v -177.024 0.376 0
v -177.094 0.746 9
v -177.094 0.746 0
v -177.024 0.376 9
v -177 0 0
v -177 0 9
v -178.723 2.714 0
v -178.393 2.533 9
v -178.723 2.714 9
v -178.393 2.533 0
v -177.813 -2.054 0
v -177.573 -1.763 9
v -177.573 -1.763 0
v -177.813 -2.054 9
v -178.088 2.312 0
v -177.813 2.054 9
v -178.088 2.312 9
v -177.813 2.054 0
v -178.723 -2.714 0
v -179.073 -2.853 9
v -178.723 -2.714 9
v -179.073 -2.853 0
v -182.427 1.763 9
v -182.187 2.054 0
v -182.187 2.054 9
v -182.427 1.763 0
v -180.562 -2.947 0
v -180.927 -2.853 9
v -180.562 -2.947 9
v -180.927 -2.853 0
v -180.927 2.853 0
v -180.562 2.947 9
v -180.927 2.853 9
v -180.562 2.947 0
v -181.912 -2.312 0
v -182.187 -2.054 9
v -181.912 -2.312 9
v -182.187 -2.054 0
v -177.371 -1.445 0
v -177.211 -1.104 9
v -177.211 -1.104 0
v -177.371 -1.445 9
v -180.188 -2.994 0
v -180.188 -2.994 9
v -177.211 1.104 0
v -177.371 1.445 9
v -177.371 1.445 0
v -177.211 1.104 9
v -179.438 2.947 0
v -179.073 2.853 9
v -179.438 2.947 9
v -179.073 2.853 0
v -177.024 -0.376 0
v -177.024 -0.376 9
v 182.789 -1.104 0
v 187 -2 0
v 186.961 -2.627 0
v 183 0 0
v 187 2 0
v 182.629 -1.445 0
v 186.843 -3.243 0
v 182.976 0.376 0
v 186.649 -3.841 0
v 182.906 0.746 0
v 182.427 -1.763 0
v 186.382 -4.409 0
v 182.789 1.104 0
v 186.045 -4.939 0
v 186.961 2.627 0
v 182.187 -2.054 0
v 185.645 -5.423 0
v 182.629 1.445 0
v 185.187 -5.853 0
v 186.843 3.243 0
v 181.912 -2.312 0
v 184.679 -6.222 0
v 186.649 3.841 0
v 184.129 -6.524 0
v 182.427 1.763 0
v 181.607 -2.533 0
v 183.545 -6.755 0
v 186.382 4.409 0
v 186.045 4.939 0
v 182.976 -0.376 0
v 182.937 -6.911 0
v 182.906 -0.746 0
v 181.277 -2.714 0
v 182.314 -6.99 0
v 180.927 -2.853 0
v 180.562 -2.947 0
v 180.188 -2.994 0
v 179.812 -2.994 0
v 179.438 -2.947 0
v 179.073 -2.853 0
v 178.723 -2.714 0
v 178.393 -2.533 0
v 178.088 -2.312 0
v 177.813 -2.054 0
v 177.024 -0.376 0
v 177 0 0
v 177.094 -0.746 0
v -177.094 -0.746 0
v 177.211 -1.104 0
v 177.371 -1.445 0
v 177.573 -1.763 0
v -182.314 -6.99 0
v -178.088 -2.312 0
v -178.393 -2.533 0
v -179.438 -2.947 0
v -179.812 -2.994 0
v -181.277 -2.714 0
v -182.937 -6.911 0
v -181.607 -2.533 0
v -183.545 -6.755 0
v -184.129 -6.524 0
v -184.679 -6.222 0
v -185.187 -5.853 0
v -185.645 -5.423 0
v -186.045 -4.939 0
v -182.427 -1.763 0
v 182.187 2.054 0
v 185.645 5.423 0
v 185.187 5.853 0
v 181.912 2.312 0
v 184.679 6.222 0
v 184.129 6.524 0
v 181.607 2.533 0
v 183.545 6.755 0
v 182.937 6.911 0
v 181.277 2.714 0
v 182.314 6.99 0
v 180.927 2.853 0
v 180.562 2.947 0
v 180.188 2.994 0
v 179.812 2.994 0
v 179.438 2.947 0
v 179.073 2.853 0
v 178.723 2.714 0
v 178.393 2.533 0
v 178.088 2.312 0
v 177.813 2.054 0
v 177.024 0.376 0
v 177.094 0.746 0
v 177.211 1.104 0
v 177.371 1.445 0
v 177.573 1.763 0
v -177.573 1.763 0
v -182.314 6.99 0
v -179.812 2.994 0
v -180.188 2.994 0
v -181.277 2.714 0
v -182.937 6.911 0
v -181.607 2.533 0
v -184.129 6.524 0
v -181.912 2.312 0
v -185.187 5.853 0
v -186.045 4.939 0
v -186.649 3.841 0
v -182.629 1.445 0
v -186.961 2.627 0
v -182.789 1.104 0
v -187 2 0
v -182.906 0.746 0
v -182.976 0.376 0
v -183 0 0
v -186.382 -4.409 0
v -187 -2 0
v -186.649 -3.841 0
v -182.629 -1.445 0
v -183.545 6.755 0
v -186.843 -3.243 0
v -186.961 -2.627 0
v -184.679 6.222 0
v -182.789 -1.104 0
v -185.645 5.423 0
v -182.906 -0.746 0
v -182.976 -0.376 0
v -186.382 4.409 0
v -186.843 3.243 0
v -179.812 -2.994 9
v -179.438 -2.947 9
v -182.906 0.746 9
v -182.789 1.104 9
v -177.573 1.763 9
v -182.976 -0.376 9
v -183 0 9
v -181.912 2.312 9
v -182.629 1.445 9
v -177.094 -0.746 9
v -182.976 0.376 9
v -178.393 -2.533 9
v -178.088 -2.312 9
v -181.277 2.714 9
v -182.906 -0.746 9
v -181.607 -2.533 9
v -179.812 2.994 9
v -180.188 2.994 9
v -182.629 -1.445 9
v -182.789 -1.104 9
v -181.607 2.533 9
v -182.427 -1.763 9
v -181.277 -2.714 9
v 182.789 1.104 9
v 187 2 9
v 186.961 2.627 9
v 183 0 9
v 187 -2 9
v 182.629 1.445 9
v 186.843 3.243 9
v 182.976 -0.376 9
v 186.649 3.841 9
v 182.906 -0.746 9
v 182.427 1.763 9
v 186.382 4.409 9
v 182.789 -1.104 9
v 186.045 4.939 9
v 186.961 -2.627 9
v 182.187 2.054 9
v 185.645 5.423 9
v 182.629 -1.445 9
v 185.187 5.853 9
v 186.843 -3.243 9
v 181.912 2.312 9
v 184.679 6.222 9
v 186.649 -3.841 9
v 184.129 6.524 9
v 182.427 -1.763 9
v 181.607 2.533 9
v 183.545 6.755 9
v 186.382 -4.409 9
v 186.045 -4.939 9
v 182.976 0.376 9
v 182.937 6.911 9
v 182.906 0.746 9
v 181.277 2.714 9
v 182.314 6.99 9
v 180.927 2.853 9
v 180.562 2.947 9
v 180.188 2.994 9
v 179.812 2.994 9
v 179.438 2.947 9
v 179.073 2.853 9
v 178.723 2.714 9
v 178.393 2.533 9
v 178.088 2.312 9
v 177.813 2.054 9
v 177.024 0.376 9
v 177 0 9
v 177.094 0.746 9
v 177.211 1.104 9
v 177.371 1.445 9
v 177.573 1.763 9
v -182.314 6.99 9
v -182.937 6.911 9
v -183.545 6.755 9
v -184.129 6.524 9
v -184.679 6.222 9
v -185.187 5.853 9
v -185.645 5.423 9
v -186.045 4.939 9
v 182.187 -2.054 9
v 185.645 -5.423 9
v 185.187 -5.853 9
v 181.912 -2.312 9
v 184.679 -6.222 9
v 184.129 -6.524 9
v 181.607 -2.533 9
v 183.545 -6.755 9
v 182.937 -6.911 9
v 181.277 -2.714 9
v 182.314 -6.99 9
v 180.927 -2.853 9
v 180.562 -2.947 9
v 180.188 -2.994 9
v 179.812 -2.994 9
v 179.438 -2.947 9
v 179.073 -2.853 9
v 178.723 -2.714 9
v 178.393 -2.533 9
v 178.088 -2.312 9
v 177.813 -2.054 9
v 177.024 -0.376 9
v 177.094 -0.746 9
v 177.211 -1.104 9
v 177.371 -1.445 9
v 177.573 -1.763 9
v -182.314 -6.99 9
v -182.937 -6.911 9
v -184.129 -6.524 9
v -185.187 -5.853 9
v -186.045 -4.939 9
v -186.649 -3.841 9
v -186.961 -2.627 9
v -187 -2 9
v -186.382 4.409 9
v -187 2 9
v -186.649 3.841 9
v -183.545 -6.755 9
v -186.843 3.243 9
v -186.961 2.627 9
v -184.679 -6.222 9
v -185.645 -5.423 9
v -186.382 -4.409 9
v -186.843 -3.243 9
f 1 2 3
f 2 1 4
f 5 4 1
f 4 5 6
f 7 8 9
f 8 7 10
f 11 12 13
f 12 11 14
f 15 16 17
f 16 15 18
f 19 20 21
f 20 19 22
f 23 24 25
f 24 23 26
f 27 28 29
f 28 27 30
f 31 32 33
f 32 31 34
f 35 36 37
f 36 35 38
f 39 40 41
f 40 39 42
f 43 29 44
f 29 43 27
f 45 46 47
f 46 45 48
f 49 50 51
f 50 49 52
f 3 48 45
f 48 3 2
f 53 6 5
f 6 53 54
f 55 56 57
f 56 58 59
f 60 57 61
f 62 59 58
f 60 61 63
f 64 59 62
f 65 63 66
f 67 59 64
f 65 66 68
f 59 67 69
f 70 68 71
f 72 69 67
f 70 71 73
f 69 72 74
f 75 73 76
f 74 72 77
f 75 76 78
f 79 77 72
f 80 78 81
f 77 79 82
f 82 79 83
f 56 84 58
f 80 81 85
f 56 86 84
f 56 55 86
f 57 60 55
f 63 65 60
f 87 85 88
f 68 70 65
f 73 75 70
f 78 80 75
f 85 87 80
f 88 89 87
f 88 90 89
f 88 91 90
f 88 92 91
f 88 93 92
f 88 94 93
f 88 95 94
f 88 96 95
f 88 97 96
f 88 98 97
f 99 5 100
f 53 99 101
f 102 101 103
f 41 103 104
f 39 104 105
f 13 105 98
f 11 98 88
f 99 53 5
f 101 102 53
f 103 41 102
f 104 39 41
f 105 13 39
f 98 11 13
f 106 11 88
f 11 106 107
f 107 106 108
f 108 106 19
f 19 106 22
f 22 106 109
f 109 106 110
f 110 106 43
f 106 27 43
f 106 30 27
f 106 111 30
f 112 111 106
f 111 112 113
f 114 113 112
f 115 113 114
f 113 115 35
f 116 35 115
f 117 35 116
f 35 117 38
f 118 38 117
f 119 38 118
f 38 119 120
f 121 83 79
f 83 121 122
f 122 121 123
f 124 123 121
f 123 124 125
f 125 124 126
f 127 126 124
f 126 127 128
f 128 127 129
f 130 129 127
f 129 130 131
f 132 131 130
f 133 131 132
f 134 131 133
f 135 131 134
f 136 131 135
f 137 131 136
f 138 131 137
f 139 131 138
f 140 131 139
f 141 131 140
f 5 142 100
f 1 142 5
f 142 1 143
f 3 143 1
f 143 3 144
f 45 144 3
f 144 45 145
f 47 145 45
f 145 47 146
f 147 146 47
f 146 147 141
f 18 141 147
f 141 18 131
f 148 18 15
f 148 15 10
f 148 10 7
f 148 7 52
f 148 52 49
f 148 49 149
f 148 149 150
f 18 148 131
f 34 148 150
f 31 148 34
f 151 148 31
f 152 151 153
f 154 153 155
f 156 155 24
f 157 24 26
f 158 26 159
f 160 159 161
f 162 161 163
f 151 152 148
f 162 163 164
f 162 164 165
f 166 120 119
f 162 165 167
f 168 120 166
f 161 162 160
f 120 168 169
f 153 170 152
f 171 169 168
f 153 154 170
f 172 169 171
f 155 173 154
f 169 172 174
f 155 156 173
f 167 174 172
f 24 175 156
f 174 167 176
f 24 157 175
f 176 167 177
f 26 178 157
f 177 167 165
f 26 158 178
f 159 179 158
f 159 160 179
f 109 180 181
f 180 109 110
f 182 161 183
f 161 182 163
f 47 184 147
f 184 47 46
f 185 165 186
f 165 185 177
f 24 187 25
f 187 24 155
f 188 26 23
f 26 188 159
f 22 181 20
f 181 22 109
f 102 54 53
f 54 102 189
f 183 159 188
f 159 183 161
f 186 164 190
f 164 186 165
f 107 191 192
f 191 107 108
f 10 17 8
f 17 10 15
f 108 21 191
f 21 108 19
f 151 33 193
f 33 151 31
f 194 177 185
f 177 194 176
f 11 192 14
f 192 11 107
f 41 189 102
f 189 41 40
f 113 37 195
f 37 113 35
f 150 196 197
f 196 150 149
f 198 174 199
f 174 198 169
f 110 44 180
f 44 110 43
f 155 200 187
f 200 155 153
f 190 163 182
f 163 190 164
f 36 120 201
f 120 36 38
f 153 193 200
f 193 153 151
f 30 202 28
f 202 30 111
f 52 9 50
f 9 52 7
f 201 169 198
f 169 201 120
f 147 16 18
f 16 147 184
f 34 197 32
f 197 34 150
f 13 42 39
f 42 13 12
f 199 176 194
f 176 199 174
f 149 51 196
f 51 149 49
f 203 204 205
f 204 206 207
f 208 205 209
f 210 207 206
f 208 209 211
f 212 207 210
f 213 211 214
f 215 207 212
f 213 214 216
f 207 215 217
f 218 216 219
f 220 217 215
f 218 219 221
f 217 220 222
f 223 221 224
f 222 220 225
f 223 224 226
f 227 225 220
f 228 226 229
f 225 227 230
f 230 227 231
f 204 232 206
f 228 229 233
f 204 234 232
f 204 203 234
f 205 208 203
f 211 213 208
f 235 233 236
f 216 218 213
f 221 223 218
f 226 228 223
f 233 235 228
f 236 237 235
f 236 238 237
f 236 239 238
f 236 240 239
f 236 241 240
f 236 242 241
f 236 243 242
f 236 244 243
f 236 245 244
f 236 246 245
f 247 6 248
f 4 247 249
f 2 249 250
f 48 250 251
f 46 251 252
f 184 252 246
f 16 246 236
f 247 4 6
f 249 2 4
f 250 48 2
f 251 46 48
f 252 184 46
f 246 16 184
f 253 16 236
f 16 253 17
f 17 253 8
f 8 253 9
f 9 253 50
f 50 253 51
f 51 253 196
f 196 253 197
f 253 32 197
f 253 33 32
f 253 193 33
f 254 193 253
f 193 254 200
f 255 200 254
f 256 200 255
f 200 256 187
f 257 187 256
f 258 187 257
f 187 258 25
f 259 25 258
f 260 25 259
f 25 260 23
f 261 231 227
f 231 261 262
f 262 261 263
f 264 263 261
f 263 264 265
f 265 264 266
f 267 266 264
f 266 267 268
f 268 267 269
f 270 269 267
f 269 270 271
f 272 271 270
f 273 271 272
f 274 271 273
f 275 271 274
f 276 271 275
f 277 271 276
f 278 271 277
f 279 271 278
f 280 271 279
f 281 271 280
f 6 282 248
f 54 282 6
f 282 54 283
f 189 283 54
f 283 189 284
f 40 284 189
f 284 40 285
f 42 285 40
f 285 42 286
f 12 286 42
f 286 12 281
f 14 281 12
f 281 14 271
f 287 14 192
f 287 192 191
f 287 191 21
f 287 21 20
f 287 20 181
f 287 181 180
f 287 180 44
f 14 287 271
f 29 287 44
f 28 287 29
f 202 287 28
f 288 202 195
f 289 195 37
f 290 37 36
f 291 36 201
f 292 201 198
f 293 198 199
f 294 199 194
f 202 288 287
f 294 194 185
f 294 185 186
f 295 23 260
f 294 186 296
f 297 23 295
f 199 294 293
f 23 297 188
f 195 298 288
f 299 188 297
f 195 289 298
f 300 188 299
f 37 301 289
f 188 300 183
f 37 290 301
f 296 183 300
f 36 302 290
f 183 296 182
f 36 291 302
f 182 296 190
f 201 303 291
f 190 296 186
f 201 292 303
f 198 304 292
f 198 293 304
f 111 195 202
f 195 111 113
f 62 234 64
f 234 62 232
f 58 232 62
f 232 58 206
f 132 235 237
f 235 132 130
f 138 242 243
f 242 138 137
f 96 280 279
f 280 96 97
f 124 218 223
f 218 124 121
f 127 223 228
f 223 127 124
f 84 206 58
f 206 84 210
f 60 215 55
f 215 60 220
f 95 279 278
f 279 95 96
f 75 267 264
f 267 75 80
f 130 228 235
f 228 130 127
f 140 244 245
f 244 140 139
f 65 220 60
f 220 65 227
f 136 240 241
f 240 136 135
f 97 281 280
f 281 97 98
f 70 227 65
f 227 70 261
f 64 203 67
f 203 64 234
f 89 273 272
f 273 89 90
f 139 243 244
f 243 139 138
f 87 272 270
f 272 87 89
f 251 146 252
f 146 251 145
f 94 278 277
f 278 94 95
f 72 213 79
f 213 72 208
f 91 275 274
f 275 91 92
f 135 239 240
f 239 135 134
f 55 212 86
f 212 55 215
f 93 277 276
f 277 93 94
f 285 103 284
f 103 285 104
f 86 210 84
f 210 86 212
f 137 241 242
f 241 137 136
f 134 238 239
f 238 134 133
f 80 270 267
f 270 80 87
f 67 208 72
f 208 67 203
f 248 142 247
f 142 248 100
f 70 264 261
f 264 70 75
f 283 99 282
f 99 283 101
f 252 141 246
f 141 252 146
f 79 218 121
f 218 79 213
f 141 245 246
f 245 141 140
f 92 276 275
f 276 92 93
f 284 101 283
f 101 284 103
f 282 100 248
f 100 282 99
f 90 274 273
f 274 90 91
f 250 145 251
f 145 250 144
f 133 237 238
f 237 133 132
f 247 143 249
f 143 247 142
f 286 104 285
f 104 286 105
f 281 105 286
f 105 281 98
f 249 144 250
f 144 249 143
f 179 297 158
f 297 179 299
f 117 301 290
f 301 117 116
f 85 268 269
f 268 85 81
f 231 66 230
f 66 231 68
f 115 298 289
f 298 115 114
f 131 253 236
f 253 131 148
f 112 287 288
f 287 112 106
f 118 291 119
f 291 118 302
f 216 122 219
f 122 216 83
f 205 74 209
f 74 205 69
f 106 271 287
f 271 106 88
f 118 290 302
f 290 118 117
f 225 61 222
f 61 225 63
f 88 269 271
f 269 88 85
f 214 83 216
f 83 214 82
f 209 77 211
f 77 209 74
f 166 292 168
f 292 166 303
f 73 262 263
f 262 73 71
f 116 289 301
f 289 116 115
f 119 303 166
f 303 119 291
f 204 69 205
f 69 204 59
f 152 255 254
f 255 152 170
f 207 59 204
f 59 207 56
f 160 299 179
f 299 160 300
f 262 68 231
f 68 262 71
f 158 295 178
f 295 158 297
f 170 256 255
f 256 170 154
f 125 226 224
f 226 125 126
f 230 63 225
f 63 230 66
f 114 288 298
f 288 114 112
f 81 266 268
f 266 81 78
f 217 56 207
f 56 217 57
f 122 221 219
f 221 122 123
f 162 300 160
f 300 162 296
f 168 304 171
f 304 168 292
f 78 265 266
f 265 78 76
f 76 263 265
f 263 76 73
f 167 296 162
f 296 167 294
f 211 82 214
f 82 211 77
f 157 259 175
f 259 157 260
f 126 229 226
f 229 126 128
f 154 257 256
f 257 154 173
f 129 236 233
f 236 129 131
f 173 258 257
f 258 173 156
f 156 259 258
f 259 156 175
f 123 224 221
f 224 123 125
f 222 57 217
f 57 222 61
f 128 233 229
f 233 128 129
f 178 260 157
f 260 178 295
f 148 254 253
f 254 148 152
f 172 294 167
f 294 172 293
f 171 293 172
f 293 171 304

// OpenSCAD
$fn = 50;


difference() {
	union() {
		hull() {
			translate(v = [-182.0000000000, 2.0000000000, 0]) {
				cylinder(h = 9, r = 5);
			}
			translate(v = [182.0000000000, 2.0000000000, 0]) {
				cylinder(h = 9, r = 5);
			}
			translate(v = [-182.0000000000, -2.0000000000, 0]) {
				cylinder(h = 9, r = 5);
			}
			translate(v = [182.0000000000, -2.0000000000, 0]) {
				cylinder(h = 9, r = 5);
			}
		}
	}
	union() {
		translate(v = [-180.0000000000, 0.0000000000, 0]) {
			cylinder(h = 9, r = 3.0000000000);
		}
		translate(v = [180.0000000000, 0.0000000000, 0]) {
			cylinder(h = 9, r = 3.0000000000);
		}
		translate(v = [-180.0000000000, 0.0000000000, 0]) {
			cylinder(h = 9, r = 1.5000000000);
		}
		translate(v = [180.0000000000, 0.0000000000, 0]) {
			cylinder(h = 9, r = 1.5000000000);
		}
		translate(v = [-180.0000000000, 0.0000000000, 0]) {
			cylinder(h = 9, r = 1.5000000000);
		}
		translate(v = [180.0000000000, 0.0000000000, 0]) {
			cylinder(h = 9, r = 1.5000000000);
		}
		translate(v = [-180.0000000000, 0.0000000000, 0]) {
			cylinder(h = 9, r = 1.5000000000);
		}
		translate(v = [180.0000000000, 0.0000000000, 0]) {
			cylinder(h = 9, r = 1.5000000000);
		}
	}
}
